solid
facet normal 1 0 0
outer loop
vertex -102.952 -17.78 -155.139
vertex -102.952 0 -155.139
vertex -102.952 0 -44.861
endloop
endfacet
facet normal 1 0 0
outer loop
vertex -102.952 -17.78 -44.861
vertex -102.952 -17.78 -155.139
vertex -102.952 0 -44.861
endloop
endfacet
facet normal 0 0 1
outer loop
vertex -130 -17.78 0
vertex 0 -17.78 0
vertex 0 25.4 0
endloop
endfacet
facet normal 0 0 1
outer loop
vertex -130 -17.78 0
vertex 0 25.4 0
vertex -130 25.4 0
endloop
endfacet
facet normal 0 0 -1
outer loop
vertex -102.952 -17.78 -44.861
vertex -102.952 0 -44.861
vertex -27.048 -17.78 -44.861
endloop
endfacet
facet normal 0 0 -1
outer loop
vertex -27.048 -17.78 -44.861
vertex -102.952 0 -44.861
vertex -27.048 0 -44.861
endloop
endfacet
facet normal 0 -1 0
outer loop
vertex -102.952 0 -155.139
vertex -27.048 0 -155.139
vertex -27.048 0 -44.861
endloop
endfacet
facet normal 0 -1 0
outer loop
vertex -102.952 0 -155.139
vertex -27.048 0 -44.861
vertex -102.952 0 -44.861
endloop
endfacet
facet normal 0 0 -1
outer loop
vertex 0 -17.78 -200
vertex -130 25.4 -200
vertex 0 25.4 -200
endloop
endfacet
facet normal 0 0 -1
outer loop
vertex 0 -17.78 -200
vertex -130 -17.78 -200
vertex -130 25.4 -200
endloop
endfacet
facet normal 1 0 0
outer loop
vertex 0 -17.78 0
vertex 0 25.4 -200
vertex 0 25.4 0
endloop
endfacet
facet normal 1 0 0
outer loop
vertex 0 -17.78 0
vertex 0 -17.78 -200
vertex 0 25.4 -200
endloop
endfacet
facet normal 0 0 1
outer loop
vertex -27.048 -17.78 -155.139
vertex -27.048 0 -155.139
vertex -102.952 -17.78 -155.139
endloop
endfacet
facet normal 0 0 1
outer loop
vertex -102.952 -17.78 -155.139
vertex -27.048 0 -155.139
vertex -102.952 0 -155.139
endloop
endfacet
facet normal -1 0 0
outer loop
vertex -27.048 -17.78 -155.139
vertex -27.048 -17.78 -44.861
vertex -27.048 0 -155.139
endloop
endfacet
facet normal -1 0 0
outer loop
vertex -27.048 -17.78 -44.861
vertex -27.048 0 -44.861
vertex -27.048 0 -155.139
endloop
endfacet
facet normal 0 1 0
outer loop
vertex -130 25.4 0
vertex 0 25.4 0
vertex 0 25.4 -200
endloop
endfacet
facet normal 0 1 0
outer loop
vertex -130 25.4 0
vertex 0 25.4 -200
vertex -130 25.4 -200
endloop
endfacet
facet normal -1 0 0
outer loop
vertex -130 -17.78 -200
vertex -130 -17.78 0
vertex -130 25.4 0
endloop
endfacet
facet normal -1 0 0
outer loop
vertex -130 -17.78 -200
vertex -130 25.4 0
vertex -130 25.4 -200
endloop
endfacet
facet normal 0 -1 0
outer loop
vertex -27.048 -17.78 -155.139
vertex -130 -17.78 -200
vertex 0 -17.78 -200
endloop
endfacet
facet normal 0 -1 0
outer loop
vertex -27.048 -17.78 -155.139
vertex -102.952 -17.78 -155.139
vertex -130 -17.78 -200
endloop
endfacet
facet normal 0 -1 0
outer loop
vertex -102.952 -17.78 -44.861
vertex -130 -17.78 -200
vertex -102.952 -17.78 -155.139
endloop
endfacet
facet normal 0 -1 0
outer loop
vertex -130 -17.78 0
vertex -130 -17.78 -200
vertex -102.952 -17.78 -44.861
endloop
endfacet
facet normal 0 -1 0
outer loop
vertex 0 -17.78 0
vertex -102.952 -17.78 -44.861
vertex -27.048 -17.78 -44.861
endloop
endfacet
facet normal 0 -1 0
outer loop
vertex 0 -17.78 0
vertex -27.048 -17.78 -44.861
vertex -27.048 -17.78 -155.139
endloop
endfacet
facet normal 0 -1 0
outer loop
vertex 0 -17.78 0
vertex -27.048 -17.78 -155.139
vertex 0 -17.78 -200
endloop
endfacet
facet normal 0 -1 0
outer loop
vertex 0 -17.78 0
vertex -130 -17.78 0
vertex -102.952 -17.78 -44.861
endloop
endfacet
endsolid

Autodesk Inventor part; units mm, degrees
ref_plane "YZ Plane" through (0, 0, 0) normal (1, 0, 0) x (0, 1, 0)
ref_plane "XZ Plane" through (0, 0, 0) normal (0, 1, 0) x (-1, 0, 0)
ref_plane "XY Plane" through (0, 0, 0) normal (0, 0, 1) x (1, 0, 0)
sketch "Sketch1" plane through (0, 0, 0) normal (0, 1, 0) x (-1, 0, 0)
  line L0 (0, 0) -> (130, 0)
  line L1 (130, 0) -> (130, -200)
  line L2 (130, -200) -> (0, -200)
  line L3 (0, -200) -> (0, 0)
  dimension "d0" = 130
  dimension "d1" = 200
extrude "Extrusion1" add sketch "Sketch1" along normal blind 25.4
sketch "Sketch2" plane through (0, 0, 0) normal (0, -1, 0) x (1, 0, 0)
  line L0 (0, -200) -> (-130, -200) projected
  line L1 (0, 0) -> (0, -200) projected
  line L2 (-102.952, -44.8611) -> (-27.048, -44.8611)
  line L3 (-27.048, -44.8611) -> (-27.048, -155.1389)
  line L4 (-27.048, -155.1389) -> (-102.952, -155.1389)
  line L5 (-102.952, -155.1389) -> (-102.952, -44.8611)
  line L6 (-102.952, -44.8611) -> (-27.048, -155.1389) construction
  line L7 (-27.048, -44.8611) -> (-102.952, -155.1389) construction
  line L8 (-130, -200) -> (-130, 0) projected
  line L9 (-130, 0) -> (0, 0) projected
  point P0 (-65, -100)
extrude "Extrusion2" add sketch "Sketch2" along normal blind 17.78
properties part number "Electronics place holder"
